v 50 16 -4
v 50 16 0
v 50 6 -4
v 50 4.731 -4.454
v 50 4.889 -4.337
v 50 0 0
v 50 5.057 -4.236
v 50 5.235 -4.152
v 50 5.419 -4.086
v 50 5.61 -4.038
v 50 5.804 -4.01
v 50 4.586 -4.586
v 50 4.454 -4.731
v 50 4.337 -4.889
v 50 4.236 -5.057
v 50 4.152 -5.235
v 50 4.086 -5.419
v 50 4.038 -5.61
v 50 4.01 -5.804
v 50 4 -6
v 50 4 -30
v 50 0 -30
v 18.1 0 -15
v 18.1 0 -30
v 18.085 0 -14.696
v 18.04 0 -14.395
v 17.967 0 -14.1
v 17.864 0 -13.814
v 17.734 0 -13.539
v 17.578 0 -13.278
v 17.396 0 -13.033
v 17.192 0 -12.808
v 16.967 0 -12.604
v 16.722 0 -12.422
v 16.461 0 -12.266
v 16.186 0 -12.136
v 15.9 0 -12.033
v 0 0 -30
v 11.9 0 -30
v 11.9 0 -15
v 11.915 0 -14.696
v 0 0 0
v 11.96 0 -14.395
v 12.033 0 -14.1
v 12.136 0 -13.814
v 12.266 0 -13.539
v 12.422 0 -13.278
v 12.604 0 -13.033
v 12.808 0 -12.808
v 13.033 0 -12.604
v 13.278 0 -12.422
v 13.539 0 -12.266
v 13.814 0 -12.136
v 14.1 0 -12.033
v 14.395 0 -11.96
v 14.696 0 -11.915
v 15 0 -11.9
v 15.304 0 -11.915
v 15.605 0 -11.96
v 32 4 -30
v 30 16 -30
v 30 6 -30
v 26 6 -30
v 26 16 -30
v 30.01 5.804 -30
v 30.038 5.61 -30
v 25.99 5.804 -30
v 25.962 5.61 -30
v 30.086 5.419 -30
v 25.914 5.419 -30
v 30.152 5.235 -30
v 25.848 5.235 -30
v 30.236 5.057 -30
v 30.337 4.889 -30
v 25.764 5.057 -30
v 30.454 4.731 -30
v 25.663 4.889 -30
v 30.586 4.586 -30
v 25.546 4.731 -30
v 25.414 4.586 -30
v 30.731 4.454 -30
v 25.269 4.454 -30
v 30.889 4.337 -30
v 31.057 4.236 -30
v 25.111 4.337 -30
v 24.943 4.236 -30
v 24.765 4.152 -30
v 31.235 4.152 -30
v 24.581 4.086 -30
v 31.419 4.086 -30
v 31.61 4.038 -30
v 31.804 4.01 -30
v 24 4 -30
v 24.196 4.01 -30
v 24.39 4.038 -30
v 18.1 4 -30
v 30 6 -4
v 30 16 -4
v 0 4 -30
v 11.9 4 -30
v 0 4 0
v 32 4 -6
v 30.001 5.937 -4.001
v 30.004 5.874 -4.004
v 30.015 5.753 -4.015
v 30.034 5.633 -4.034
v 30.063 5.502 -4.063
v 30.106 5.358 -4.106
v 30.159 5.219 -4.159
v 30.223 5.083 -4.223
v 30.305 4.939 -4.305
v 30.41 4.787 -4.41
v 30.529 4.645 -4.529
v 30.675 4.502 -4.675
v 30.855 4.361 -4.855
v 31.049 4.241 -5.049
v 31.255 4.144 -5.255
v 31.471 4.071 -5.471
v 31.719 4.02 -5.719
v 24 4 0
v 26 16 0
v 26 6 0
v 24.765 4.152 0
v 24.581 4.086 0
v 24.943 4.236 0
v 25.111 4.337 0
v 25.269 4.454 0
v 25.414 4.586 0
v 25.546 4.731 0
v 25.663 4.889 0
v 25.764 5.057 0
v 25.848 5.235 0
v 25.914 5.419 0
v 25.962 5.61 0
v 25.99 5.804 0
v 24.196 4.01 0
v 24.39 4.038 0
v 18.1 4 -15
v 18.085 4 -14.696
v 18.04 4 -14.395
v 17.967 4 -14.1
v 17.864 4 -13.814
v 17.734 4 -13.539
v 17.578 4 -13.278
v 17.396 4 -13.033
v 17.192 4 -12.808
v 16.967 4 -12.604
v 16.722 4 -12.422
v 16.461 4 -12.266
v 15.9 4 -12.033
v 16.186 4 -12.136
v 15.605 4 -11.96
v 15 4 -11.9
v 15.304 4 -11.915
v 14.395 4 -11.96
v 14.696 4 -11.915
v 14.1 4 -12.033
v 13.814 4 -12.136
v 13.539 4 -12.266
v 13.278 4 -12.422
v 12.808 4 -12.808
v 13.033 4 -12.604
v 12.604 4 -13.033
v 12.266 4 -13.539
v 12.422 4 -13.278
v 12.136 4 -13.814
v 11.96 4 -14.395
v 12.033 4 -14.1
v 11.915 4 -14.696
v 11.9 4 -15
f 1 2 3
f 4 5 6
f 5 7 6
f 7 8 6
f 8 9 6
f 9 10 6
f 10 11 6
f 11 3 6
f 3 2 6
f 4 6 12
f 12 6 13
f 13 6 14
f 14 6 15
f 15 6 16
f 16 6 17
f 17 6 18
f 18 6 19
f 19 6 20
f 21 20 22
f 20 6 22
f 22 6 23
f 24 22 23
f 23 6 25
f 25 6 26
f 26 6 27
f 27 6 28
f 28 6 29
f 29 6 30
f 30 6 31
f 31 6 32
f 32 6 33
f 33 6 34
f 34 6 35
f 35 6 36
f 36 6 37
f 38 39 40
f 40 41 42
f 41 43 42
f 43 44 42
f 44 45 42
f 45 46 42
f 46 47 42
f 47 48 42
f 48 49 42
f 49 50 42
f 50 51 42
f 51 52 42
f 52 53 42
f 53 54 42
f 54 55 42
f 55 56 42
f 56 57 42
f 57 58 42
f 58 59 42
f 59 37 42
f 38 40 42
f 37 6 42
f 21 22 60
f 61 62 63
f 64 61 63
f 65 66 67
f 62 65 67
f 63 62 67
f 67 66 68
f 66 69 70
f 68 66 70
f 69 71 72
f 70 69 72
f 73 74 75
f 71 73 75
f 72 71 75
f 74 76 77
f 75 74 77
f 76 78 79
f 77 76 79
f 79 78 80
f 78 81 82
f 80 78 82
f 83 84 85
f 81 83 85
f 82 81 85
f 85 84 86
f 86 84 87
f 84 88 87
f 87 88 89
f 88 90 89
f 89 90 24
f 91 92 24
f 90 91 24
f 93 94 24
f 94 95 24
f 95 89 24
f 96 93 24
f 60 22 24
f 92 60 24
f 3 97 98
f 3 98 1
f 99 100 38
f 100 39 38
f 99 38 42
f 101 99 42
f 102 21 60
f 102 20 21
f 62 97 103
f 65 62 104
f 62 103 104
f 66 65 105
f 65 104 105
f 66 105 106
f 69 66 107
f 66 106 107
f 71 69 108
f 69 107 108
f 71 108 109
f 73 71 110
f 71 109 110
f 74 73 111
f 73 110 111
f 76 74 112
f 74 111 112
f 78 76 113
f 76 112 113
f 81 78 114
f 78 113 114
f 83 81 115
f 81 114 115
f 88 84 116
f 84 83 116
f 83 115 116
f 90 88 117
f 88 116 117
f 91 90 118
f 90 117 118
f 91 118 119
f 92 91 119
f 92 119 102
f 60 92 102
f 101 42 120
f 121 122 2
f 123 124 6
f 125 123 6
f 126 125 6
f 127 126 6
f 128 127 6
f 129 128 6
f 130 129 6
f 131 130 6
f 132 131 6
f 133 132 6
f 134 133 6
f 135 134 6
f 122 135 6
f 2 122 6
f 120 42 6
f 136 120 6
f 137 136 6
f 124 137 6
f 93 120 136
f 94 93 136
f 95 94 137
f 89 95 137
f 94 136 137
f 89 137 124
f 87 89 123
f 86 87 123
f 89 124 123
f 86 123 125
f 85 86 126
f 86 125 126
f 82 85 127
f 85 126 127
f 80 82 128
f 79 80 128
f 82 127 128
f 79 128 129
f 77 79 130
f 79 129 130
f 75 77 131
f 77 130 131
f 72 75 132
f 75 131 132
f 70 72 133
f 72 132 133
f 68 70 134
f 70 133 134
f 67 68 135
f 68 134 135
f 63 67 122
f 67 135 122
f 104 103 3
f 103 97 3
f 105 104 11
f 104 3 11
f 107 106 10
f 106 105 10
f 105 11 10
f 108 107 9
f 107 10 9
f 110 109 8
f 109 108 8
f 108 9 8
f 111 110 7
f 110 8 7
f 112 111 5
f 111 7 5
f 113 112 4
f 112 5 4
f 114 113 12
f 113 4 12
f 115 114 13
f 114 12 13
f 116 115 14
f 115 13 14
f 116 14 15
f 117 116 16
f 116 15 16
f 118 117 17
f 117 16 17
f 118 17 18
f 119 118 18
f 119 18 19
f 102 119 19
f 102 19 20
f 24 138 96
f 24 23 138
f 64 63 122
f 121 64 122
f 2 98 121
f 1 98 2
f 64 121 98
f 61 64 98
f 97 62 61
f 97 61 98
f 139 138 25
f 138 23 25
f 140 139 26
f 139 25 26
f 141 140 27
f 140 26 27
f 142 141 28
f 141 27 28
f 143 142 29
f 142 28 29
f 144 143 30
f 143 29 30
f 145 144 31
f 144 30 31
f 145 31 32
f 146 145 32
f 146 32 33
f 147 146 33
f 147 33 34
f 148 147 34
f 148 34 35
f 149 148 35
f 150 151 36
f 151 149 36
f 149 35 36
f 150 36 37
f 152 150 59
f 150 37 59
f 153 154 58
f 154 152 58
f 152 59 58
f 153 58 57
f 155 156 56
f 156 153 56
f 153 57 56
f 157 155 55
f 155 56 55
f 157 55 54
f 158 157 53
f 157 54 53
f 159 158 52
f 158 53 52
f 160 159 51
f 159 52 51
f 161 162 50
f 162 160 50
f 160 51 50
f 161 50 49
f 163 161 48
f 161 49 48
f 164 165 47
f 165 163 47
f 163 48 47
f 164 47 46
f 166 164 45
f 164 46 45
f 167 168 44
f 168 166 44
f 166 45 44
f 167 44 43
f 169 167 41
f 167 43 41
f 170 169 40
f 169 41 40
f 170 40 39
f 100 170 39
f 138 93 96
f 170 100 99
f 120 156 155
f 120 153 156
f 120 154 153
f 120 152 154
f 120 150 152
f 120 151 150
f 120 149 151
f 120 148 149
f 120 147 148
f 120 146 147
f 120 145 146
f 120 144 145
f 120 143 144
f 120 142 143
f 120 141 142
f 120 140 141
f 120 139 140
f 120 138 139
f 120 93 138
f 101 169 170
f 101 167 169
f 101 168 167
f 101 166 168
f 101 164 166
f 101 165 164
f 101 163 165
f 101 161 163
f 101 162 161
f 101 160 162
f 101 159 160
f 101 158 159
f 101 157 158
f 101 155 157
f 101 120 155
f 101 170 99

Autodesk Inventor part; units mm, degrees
ref_plane "YZ Plane" through (0, 0, 0) normal (1, 0, 0) x (0, 1, 0)
ref_plane "XZ Plane" through (0, 0, 0) normal (0, 1, 0) x (-1, 0, 0)
ref_plane "XY Plane" through (0, 0, 0) normal (0, 0, 1) x (1, 0, 0)
sketch "Sketch1" plane through (0, 0, 0) normal (0, 1, 0) x (-1, 0, 0)
  line L0 (0, 0) -> (-50, 0)
  line L1 (-50, 0) -> (-50, -30)
  line L2 (0, -30) -> (0, 0)
  line L3 (-50, -15) -> (-15, -15) construction
  arc A0 (-11.9, -15) -> (-18.1, -15) centre (-15, -15) ccw
  line L4 (-11.9, -15) -> (-11.9, -30)
  line L5 (-18.1, -15) -> (-18.1, -30)
  line L6 (-50, -30) -> (-18.1, -30)
  line L7 (-11.9, -30) -> (0, -30)
  dimension "d0" = 35
  dimension "d1" = 6.2
  dimension "d2" = 30
  dimension "d3" = 50
extrude "Extrusion1" add sketch "Sketch1" along normal blind 4
sketch "Sketch3" plane through (0, 4, 0) normal (0, 1, 0) x (1, 0, 0)
  line L0 (50, 30) -> (18.1, 30) projected
  line L1 (30, 30) -> (30, 4)
  line L2 (30, 4) -> (50, 4)
  line L3 (0, 30) -> (0, 0) projected
  line L4 (26, 30) -> (26, 0)
  line L5 (0, 0) -> (50, 0) projected
  line L6 (50, 0) -> (50, 30) projected
  dimension "d12" = 30
  dimension "d13" = 4
  dimension "d14" = 4
extrude "Extrusion3" add sketch "Sketch3" along normal blind 12 contours L1 L2 L6 L5 L4 L0
fillet "Fillet2" radius 2 3 edges at (26, 4, -15) (30, 4, -17) (40, 4, -4)
properties part number "Laptop-ecke-l_3DPrint"
